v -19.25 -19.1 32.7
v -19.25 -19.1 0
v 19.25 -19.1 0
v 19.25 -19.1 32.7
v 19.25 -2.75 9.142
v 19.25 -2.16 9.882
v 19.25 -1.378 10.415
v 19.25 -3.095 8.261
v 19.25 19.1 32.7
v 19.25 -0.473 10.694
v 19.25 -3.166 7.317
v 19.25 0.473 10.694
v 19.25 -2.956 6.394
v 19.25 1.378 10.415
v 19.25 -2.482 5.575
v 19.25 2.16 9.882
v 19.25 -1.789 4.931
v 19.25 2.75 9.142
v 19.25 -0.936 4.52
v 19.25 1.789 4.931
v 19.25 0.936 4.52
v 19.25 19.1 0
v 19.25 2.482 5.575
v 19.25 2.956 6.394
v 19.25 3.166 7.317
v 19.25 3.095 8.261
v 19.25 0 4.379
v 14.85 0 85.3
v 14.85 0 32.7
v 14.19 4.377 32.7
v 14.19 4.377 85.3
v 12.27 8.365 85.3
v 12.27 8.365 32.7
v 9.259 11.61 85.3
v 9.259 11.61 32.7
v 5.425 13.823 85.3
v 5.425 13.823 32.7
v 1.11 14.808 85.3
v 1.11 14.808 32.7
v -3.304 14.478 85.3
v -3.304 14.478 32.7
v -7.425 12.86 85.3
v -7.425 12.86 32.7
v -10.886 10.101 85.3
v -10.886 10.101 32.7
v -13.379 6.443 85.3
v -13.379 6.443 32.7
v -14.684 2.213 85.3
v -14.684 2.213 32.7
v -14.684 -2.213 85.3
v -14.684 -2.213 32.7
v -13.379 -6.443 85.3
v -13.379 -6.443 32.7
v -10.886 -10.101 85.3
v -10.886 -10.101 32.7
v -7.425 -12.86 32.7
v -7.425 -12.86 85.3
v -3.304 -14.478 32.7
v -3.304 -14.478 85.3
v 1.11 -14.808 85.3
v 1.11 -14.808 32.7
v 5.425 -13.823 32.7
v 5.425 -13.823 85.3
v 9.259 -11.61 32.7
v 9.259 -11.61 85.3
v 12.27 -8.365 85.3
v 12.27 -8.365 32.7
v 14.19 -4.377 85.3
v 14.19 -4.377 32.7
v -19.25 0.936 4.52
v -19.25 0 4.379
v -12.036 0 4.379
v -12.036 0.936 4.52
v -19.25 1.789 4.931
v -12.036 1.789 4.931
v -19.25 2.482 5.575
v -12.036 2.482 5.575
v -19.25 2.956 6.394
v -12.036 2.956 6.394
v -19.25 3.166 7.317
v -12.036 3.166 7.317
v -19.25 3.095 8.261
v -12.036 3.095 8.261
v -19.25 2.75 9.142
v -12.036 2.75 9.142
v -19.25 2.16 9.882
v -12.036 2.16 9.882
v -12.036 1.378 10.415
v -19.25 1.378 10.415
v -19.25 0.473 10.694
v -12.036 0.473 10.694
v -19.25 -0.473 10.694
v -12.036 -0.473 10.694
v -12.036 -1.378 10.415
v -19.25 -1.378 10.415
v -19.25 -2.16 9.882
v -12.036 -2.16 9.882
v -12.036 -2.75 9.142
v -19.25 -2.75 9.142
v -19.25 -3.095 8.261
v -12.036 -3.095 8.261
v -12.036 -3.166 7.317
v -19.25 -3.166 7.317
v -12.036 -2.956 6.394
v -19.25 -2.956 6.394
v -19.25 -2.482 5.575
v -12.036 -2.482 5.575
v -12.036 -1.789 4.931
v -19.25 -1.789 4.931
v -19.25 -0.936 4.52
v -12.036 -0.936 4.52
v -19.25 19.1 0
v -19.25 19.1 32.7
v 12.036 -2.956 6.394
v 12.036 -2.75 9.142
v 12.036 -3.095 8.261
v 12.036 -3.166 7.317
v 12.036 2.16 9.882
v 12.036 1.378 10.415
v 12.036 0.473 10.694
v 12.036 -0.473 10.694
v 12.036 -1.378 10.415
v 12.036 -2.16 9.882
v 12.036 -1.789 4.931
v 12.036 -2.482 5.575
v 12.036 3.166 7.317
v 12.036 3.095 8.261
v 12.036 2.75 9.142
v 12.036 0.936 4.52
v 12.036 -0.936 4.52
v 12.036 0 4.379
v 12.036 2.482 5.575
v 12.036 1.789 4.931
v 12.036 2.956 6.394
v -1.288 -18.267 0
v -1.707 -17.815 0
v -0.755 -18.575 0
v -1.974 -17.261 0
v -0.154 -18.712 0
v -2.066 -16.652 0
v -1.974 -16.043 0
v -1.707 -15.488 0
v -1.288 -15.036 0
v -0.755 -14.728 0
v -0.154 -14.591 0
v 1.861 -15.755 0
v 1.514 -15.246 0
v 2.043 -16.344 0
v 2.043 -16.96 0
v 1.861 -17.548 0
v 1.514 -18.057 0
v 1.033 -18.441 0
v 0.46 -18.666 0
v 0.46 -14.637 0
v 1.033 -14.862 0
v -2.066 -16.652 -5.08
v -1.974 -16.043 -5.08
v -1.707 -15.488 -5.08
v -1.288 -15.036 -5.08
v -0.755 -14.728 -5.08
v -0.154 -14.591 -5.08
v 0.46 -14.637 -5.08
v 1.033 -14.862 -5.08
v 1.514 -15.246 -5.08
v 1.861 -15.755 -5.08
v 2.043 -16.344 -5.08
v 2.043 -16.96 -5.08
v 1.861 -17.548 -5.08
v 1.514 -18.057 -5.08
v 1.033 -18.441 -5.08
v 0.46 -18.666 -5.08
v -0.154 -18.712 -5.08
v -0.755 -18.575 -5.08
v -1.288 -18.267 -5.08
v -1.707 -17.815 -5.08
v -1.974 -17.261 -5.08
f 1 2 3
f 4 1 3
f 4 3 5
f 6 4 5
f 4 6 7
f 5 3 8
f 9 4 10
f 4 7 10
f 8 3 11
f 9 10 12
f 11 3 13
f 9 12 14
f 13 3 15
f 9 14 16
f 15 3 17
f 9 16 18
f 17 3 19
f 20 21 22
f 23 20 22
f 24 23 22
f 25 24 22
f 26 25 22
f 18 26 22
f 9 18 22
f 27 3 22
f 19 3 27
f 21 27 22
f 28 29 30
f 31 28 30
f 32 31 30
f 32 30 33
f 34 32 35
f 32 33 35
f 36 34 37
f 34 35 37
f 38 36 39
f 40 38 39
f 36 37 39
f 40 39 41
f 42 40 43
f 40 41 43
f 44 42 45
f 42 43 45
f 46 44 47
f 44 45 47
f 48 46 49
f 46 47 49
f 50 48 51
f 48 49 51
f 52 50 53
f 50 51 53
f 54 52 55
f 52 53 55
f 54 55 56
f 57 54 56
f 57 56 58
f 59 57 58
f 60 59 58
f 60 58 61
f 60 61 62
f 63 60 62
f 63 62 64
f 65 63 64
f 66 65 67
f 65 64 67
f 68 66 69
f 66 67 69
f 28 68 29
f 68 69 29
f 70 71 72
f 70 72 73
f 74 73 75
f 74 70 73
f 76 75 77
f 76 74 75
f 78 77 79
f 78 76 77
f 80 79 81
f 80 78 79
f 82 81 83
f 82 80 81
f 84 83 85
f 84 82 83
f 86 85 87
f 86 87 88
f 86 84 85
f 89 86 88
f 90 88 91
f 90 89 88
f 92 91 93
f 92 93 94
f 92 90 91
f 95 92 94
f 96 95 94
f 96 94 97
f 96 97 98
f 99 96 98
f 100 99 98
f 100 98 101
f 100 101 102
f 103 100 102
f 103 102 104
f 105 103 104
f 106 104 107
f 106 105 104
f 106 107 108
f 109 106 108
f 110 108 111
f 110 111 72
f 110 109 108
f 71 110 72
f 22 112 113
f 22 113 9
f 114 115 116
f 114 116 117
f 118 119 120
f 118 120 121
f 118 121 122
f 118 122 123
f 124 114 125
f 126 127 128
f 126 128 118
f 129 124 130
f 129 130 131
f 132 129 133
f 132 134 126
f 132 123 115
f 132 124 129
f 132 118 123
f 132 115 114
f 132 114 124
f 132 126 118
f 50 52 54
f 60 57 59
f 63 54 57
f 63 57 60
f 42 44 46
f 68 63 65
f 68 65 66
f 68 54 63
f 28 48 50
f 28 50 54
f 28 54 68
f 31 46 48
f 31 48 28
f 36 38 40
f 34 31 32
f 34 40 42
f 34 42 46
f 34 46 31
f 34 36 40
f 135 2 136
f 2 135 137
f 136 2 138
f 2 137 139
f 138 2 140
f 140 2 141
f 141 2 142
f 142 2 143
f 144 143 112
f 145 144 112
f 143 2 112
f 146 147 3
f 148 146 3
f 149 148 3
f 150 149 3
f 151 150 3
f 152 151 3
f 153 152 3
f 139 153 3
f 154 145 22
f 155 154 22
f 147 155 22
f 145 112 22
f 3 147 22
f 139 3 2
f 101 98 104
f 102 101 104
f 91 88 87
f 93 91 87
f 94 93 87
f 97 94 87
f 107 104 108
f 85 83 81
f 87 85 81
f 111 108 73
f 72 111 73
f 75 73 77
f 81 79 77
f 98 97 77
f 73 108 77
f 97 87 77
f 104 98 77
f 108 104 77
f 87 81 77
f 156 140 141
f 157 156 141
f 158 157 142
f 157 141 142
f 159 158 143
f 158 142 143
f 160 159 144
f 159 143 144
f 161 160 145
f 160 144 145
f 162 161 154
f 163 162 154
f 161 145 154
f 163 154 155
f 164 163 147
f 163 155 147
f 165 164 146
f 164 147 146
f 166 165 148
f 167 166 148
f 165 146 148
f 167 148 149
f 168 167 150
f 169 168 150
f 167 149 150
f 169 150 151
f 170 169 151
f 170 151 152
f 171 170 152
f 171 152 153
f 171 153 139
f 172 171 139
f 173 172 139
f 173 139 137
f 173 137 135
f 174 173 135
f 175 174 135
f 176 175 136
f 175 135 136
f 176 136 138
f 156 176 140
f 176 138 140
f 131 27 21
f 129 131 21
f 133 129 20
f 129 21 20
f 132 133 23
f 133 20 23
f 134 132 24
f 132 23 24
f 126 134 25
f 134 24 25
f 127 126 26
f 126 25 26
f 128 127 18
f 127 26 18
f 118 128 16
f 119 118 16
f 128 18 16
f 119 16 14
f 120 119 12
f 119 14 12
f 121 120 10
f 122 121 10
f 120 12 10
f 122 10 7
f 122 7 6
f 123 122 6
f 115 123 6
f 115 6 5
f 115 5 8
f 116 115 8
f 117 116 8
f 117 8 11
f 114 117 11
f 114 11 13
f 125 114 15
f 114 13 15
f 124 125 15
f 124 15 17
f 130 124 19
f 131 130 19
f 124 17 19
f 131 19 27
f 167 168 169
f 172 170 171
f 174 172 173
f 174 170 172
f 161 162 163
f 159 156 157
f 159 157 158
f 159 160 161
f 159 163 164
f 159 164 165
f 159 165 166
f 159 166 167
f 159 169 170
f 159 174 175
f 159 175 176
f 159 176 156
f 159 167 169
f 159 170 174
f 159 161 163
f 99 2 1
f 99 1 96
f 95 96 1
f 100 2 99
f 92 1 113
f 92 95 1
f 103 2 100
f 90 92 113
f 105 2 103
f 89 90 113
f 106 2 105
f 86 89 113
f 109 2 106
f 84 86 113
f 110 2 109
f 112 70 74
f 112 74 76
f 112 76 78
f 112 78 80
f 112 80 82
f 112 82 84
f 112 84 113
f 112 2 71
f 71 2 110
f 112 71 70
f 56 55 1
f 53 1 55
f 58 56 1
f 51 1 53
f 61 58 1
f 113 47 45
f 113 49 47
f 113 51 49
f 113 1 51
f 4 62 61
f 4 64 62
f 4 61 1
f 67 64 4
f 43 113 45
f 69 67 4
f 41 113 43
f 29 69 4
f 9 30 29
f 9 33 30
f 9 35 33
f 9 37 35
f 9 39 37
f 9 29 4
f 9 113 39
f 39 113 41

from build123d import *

# Parameters (mm, degrees)
SKETCH1_W           = 38.5
SKETCH1_H           = 38.2
BOSS_EXTRUDE1_DEPTH = 32.7
SKETCH2_R           = 14.85
BOSS_EXTRUDE2_DEPTH = 52.6
SKETCH3_R           = 3.175
CUT_EXTRUDE1_DEPTH  = 7.2136
SKETCH4_R           = 2.06599734
BOSS_EXTRUDE3_DEPTH = 5.08


with BuildPart() as part:
    # Sketch1 → Boss-Extrude1 (new body)
    with BuildSketch(Plane.XY):
        Rectangle(SKETCH1_W, SKETCH1_H)
    extrude(amount=BOSS_EXTRUDE1_DEPTH)

    # Sketch2 → Boss-Extrude2 (add)
    with BuildSketch(Plane.XY.offset(32.7)):
        Circle(SKETCH2_R)
    extrude(amount=BOSS_EXTRUDE2_DEPTH)

    # Sketch3 → Cut-Extrude1 (cut)
    with BuildSketch(Plane(origin=(19.25, 0, 0), x_dir=(0, 0, -1), z_dir=(1, 0, 0))):
        with Locations((-7.554319607, 0)):
            Circle(SKETCH3_R)
    cut_extrude1 = extrude(amount=-CUT_EXTRUDE1_DEPTH, mode=Mode.SUBTRACT)

    # Mirror1: Cut-Extrude1 across plane
    add(cut_extrude1.mirror(Plane(origin=(0, 0, 0), x_dir=(0, 0, 1), z_dir=(1, 0, 0))), mode=Mode.SUBTRACT)

    # Sketch4 → Boss-Extrude3 (add)
    with BuildSketch(Plane(origin=(0, 0, 0), x_dir=(-1, 0, 0), z_dir=(0, 0, -1))):
        with Locations((0, -16.651600327)):
            Circle(SKETCH4_R)
    extrude(amount=BOSS_EXTRUDE3_DEPTH)


solid = part.part
